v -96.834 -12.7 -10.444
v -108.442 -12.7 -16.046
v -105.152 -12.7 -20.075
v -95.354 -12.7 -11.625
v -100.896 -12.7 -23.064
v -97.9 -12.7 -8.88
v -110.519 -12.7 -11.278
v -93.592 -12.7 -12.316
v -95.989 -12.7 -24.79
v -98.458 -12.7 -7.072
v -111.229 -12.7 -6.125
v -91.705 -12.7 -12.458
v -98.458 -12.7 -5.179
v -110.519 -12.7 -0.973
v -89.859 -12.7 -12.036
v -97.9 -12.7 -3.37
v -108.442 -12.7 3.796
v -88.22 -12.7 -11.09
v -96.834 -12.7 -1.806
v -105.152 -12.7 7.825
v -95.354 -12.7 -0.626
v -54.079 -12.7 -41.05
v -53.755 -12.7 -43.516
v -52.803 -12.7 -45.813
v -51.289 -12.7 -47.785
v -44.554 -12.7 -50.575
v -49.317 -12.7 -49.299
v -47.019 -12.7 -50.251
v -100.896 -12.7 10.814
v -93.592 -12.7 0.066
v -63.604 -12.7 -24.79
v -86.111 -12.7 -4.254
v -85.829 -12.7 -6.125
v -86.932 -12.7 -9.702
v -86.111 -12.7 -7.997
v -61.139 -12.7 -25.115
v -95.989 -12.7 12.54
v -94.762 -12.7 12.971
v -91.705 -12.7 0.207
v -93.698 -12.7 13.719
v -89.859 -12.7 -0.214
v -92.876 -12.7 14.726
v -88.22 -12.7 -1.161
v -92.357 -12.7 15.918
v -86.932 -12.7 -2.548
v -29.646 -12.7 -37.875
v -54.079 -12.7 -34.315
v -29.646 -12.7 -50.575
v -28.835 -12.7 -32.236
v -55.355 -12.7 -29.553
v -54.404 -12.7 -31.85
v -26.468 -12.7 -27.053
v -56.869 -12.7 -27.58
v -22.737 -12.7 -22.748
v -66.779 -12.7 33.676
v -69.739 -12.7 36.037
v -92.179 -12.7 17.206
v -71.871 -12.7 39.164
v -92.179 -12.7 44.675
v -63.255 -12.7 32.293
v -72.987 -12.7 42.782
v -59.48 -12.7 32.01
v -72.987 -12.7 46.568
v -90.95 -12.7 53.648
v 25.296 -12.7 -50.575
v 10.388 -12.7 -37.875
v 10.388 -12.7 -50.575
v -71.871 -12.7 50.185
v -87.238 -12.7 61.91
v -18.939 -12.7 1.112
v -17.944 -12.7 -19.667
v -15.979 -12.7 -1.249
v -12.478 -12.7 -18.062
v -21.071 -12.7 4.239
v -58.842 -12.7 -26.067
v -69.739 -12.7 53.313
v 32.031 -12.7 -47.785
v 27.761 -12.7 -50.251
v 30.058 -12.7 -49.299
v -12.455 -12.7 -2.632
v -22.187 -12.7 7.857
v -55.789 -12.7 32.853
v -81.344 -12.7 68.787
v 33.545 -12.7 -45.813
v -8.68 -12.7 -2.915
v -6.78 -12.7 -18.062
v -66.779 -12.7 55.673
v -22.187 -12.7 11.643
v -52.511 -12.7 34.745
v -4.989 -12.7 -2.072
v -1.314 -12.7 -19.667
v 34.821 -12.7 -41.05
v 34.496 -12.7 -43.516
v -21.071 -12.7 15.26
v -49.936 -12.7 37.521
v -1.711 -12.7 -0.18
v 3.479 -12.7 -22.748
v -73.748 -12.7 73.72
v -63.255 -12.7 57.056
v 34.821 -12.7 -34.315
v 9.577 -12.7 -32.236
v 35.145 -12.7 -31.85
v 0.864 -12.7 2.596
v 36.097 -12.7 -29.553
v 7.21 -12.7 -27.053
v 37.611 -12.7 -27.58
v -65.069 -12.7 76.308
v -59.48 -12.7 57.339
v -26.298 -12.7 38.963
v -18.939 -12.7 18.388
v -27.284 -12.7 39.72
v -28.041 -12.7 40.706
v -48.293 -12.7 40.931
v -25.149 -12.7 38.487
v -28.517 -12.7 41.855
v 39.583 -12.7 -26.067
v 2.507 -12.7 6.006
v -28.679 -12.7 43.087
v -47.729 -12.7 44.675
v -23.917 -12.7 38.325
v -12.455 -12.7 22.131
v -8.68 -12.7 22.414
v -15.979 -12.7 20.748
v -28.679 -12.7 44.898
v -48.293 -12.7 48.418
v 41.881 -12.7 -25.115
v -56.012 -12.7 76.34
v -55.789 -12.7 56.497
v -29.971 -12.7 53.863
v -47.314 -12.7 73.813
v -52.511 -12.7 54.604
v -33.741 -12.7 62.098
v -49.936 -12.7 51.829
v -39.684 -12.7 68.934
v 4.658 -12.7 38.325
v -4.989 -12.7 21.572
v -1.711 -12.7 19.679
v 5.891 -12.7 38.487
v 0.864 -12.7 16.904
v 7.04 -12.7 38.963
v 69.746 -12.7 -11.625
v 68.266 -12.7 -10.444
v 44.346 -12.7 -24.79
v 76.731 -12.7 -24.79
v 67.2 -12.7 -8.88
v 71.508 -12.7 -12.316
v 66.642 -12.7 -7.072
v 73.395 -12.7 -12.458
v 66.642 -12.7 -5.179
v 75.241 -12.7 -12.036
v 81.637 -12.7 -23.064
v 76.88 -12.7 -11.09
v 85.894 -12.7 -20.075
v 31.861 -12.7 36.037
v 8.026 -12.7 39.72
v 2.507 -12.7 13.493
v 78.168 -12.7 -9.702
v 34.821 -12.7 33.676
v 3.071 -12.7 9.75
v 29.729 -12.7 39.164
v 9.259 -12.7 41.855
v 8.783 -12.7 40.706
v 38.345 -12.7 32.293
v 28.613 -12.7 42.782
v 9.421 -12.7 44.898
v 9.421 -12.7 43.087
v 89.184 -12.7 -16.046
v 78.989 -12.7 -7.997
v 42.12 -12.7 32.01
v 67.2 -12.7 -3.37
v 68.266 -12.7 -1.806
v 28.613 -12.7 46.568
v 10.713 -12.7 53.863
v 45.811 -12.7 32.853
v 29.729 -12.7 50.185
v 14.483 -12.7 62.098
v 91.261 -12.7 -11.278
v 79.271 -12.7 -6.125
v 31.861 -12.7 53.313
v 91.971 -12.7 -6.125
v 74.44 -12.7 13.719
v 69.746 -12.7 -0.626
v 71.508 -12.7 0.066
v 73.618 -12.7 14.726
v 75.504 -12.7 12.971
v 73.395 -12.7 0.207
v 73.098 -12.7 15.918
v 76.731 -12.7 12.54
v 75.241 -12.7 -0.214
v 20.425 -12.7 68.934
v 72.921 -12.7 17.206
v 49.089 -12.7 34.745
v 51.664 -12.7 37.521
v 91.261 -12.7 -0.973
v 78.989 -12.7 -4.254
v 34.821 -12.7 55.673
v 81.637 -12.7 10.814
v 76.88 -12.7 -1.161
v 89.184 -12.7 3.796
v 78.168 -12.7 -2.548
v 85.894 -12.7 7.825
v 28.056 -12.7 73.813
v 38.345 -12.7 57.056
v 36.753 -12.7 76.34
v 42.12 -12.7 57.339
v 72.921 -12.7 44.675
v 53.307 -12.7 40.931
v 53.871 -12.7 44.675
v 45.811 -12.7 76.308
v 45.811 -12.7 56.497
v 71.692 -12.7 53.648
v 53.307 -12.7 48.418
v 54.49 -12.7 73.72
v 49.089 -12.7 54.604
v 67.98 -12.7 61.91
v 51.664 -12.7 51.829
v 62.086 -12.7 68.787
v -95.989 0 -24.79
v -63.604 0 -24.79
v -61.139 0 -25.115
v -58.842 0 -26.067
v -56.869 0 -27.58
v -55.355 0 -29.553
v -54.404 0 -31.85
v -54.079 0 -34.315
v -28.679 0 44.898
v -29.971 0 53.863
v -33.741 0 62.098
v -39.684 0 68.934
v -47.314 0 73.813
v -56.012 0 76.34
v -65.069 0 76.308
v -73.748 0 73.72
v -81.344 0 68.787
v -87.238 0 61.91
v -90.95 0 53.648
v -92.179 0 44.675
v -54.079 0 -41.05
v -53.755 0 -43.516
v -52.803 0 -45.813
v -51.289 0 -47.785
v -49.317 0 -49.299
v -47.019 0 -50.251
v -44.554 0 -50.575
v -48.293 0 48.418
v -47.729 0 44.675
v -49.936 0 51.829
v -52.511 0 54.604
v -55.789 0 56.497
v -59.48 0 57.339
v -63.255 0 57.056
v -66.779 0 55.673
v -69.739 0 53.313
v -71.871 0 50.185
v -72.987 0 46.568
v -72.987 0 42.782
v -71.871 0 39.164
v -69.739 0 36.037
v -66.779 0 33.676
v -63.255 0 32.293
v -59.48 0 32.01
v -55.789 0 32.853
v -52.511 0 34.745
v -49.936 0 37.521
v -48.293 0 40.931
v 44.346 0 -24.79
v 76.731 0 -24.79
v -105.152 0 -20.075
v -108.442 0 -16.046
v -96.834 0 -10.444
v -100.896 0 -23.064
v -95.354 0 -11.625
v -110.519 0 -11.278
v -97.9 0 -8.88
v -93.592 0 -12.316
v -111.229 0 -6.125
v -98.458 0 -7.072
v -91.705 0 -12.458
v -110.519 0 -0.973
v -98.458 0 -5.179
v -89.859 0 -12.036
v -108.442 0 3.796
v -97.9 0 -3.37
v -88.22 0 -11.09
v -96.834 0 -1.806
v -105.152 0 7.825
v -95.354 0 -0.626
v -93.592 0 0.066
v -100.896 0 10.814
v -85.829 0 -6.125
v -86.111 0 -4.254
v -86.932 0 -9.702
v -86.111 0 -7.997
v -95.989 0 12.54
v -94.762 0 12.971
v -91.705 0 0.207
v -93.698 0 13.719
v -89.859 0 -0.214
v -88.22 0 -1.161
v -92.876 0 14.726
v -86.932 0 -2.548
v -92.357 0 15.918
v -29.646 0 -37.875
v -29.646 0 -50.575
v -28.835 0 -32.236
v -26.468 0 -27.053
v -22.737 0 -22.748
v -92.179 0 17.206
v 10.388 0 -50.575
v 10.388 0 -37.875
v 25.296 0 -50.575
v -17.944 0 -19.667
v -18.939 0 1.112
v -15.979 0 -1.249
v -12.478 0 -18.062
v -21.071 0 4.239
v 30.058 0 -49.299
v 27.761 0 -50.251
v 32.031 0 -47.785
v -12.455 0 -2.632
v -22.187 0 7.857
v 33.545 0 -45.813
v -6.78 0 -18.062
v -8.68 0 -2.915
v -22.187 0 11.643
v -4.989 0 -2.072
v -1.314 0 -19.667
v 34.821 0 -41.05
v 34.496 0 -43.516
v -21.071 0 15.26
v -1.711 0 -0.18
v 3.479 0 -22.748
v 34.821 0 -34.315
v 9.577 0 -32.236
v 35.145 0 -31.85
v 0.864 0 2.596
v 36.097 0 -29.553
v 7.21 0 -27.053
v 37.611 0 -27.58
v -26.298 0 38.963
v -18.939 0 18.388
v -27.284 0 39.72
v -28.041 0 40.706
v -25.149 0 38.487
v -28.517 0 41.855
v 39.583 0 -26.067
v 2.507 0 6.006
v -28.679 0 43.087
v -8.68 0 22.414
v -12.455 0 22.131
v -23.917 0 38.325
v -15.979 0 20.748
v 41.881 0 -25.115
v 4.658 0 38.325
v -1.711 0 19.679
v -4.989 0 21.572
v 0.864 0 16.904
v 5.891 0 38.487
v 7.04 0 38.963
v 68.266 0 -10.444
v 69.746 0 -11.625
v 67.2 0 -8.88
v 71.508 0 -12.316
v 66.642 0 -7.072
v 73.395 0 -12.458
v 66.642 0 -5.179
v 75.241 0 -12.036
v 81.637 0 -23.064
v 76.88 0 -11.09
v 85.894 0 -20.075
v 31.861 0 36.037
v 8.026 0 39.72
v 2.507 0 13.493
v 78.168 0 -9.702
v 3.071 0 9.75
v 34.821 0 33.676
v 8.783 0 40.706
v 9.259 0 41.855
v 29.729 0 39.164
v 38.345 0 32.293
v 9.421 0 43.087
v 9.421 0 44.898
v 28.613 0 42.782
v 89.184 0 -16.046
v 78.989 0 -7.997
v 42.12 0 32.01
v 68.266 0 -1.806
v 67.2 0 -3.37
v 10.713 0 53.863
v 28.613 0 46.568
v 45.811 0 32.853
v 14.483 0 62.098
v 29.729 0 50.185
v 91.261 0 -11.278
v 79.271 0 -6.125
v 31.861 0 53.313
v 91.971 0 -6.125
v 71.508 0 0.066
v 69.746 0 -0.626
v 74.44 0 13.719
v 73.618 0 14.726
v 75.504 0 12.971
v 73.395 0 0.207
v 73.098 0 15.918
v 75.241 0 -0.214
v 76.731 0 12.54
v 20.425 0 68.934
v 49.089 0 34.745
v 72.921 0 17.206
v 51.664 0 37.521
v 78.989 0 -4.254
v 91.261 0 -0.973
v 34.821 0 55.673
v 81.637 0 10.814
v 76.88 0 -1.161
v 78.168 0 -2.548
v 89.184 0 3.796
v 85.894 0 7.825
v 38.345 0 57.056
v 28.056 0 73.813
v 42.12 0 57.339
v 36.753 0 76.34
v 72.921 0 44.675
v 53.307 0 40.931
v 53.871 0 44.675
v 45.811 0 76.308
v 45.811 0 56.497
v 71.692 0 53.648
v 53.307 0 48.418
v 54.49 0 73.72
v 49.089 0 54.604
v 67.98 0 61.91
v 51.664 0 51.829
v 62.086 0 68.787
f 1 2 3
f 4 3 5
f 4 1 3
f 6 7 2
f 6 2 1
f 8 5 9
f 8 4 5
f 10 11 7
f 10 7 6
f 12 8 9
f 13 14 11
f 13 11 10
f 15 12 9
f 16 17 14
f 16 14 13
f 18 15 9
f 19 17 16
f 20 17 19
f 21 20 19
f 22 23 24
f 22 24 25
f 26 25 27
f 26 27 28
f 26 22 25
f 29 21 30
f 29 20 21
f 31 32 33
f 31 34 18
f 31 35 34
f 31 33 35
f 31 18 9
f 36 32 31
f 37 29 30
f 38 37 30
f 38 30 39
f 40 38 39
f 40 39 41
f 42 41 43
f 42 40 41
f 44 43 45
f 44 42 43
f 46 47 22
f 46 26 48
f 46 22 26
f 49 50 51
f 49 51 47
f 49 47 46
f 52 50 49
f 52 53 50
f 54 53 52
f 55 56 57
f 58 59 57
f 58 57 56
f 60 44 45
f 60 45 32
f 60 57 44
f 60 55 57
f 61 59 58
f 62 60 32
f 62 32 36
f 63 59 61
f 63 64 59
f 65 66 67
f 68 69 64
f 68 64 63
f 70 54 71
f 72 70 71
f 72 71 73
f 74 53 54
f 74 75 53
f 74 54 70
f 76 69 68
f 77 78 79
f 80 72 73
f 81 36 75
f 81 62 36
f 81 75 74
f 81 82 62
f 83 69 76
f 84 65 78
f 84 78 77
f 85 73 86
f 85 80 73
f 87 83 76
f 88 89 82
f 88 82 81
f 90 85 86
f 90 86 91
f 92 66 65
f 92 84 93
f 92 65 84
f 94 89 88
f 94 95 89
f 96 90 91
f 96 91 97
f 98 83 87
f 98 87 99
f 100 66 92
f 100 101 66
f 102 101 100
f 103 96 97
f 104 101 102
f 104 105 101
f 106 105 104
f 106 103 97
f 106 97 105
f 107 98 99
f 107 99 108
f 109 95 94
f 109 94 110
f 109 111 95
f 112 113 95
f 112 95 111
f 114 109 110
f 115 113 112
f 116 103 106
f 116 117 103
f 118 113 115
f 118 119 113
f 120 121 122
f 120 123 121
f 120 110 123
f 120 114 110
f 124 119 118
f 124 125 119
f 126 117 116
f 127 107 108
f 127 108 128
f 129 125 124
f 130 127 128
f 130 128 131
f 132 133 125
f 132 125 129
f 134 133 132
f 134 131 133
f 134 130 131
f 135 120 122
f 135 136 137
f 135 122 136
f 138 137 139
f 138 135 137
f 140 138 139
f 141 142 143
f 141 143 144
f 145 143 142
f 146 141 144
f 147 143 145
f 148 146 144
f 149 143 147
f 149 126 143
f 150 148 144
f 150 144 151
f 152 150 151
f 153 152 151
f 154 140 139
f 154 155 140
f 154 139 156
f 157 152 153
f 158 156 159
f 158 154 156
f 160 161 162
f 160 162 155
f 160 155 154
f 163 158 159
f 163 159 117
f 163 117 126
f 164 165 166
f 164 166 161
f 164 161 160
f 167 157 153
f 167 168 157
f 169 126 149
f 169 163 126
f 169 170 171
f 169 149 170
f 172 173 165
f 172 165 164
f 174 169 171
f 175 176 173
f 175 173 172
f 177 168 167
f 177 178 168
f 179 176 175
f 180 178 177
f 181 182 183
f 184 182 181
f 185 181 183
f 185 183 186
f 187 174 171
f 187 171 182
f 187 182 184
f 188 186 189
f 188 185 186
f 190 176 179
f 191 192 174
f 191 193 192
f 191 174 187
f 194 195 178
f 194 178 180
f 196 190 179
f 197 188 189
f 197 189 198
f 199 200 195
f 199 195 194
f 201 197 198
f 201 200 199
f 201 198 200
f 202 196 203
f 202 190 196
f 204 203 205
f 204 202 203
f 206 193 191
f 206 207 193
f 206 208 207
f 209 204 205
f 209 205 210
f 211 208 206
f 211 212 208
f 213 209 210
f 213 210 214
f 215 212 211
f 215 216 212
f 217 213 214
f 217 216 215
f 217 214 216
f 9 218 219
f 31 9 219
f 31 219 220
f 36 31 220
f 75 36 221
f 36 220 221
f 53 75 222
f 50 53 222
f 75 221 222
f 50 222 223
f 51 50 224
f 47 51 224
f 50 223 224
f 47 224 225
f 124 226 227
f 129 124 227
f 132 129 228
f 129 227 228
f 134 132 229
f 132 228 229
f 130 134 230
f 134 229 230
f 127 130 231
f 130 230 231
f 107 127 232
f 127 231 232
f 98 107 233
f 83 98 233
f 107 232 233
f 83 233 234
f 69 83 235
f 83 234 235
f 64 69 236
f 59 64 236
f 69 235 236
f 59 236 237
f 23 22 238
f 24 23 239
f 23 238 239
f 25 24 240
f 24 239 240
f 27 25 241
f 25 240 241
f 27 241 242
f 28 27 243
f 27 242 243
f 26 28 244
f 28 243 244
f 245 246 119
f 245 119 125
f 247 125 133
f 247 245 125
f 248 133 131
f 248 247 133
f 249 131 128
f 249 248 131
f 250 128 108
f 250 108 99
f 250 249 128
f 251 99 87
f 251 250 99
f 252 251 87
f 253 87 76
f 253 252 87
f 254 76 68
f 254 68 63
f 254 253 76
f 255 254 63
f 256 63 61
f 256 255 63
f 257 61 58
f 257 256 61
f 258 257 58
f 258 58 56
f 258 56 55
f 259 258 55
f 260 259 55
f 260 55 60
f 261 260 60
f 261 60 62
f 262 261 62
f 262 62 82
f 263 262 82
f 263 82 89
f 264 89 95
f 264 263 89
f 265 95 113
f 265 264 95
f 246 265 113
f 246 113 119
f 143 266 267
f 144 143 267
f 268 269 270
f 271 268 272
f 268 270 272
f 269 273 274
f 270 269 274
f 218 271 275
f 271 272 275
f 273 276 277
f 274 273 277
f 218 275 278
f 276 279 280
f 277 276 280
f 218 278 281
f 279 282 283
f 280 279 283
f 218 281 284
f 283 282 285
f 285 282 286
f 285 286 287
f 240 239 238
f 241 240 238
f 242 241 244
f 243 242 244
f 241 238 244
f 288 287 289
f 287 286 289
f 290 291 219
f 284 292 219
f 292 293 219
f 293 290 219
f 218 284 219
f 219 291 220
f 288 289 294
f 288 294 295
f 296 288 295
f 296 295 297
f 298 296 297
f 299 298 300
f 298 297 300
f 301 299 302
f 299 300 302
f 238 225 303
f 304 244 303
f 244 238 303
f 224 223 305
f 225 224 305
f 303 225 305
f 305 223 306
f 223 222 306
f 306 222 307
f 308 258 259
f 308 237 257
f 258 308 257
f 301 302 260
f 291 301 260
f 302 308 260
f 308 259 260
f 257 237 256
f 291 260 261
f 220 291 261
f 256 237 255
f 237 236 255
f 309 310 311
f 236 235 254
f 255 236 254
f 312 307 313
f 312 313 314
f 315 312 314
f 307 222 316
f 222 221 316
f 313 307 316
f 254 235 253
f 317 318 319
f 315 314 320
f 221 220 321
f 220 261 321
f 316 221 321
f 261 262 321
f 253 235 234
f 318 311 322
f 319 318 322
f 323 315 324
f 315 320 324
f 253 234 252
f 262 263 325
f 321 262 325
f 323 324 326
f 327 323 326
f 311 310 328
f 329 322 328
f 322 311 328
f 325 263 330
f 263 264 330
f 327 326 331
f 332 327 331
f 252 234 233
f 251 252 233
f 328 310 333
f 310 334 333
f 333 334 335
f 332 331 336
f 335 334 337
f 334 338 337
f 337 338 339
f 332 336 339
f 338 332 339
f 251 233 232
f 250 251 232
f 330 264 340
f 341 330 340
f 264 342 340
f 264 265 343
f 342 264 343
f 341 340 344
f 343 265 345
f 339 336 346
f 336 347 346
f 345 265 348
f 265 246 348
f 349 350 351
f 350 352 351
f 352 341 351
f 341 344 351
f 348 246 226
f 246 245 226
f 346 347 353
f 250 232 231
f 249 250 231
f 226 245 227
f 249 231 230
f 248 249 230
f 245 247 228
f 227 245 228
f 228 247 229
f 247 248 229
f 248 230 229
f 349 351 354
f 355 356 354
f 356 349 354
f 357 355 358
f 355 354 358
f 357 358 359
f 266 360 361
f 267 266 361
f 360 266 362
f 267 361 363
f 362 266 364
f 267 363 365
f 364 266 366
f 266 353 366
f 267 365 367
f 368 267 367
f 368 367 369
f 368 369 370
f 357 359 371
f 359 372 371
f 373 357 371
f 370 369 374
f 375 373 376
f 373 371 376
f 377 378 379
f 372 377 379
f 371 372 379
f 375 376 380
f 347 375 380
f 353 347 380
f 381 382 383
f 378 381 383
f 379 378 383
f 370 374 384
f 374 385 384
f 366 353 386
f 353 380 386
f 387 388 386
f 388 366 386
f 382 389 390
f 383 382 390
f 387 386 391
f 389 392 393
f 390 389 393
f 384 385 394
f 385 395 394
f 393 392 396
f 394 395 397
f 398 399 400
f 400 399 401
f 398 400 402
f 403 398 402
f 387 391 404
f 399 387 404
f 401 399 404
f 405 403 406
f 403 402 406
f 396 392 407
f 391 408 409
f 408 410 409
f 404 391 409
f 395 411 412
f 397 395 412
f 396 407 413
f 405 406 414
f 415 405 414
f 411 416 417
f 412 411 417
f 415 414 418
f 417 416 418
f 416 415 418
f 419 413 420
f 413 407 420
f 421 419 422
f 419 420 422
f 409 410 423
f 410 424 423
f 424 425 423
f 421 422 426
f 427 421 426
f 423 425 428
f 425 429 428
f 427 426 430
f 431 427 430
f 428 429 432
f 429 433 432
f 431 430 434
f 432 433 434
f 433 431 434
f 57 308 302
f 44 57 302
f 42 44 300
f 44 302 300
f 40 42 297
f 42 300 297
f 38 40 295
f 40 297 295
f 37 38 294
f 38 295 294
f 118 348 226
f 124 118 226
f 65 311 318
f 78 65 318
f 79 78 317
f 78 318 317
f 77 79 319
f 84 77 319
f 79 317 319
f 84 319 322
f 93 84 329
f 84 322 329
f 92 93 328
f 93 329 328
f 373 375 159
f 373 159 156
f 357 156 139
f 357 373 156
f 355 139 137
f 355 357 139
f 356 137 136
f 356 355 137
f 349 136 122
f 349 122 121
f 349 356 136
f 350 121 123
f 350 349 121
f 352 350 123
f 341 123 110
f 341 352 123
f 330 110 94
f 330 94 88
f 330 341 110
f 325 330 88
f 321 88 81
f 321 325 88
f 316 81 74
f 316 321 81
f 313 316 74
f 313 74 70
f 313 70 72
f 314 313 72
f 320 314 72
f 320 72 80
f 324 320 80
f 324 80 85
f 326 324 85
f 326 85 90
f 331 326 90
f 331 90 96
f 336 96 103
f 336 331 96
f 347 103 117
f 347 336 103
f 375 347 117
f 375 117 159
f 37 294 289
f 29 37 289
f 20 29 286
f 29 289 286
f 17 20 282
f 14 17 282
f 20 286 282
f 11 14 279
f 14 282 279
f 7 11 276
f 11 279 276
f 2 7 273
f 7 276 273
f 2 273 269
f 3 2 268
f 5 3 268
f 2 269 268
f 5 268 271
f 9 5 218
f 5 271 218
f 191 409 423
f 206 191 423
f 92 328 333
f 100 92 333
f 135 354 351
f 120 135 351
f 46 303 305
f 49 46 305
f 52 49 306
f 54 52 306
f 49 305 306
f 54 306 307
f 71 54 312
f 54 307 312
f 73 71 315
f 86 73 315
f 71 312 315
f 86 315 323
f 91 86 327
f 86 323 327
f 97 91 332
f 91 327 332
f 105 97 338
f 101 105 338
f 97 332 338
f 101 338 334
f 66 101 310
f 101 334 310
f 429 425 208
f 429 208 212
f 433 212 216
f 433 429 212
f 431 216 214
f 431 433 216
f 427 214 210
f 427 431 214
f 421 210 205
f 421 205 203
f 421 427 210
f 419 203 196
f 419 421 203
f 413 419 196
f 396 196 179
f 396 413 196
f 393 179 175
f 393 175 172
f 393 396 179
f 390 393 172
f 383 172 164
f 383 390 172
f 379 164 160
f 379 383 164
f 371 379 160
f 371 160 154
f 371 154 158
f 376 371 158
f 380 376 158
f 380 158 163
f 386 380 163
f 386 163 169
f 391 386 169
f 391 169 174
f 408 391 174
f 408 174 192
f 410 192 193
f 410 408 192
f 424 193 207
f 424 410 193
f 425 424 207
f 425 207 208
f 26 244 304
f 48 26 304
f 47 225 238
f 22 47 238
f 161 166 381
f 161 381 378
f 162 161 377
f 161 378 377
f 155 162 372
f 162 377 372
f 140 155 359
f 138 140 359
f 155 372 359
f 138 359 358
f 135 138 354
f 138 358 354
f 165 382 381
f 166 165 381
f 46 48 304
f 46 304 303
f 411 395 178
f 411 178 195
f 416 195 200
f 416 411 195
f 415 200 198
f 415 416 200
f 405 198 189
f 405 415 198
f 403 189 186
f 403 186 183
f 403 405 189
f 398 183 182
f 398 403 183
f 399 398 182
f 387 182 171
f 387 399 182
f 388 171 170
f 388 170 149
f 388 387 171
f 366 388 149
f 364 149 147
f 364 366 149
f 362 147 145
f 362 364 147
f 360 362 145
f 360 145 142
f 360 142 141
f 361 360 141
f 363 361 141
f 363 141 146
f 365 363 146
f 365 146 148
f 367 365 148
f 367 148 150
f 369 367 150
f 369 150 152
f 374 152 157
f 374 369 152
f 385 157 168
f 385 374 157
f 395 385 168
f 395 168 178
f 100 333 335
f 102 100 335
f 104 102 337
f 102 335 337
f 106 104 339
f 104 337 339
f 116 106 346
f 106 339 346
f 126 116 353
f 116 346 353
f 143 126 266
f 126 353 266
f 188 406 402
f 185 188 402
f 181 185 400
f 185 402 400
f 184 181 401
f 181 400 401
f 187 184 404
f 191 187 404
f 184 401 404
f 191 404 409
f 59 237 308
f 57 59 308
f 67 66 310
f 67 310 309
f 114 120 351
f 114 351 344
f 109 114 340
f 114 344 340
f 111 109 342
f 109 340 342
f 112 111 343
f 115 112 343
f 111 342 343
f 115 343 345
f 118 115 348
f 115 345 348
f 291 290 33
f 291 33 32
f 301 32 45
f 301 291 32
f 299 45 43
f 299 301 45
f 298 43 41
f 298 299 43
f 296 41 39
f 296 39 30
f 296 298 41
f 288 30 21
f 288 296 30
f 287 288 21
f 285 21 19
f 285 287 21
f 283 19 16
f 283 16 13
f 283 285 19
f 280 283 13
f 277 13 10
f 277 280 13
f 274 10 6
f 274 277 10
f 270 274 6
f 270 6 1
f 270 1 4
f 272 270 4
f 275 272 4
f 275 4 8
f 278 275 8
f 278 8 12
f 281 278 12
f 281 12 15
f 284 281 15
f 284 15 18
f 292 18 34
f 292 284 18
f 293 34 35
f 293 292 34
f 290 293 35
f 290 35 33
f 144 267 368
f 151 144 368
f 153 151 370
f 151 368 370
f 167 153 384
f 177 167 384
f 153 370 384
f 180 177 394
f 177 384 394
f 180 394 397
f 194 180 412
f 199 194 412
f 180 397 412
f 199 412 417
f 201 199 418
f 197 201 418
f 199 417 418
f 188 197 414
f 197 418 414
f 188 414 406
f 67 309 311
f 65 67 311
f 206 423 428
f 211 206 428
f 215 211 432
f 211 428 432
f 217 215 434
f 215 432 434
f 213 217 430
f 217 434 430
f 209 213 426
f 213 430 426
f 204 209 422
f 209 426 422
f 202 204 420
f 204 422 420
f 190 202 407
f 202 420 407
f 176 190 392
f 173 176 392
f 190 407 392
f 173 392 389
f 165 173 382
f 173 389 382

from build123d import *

# Parameters (mm, degrees)
F0_R     = 6.35
F0_R_2   = 12.7
F1_DEPTH = 12.7


with BuildPart() as f1:
    # F0 (on Front) → F1 (new body)
    with BuildSketch(Plane.XZ):
        with BuildLine():
            Line((4.658427, 38.324708), (-23.916573, 38.324708))
            ThreePointArc((-23.916573, 38.324708), (-27.284169, 39.719612), (-28.679073, 43.087208))
            Line((-28.679073, 43.087208), (-28.679073, 44.898387))
            ThreePointArc((-28.679073, 44.898387), (-60.541307, 76.648584), (-92.179073, 44.674708))
            Line((-92.179073, 44.674708), (-92.179073, 17.206098))
            ThreePointArc((-92.179073, 17.206098), (-93.252557, 14.194029), (-95.989073, 12.53982))
            ThreePointArc((-95.989073, 12.53982), (-111.229073, -6.125292), (-95.989073, -24.790403))
            Line((-95.989073, -24.790403), (-92.179073, -24.790403))
            Line((-92.179073, -24.790403), (-63.604073, -24.790403))
            ThreePointArc((-63.604073, -24.790403), (-56.868881, -27.580211), (-54.079073, -34.315403))
            Line((-54.079073, -34.315403), (-54.079073, -41.050292))
            ThreePointArc((-54.079073, -41.050292), (-51.289266, -47.785484), (-44.554073, -50.575292))
            Line((-44.554073, -50.575292), (-29.646001, -50.575292))
            Line((-29.646001, -50.575292), (-29.646001, -37.875292))
            ThreePointArc((-29.646001, -37.875292), (-9.629073, -17.858364), (10.387854, -37.875292))
            Line((10.387854, -37.875292), (10.387854, -50.575292))
            Line((10.387854, -50.575292), (25.295927, -50.575292))
            ThreePointArc((25.295927, -50.575292), (32.031119, -47.785484), (34.820927, -41.050292))
            Line((34.820927, -41.050292), (34.820927, -34.315403))
            ThreePointArc((34.820927, -34.315403), (37.610734, -27.580211), (44.345927, -24.790403))
            Line((44.345927, -24.790403), (72.920927, -24.790403))
            Line((72.920927, -24.790403), (76.730927, -24.790403))
            ThreePointArc((76.730927, -24.790403), (91.970927, -6.125292), (76.730927, 12.53982))
            ThreePointArc((76.730927, 12.53982), (73.99441, 14.194029), (72.920927, 17.206098))
            Line((72.920927, 17.206098), (72.920927, 44.674708))
            ThreePointArc((72.920927, 44.674708), (41.28316, 76.648584), (9.420927, 44.898387))
            Line((9.420927, 44.898387), (9.420927, 43.087208))
            ThreePointArc((9.420927, 43.087208), (8.026023, 39.719612), (4.658427, 38.324708))
        make_face()
        with Locations((-92.179073, -6.125292)):
            Circle(F0_R, mode=Mode.SUBTRACT)
        with Locations((-9.629073, 9.749708)):
            Circle(F0_R_2, mode=Mode.SUBTRACT)
        with Locations((72.920927, -6.125292)):
            Circle(F0_R, mode=Mode.SUBTRACT)
        with Locations((-60.429073, 44.674708)):
            Circle(F0_R_2, mode=Mode.SUBTRACT)
        with Locations((41.170927, 44.674708)):
            Circle(F0_R_2, mode=Mode.SUBTRACT)
    extrude(amount=F1_DEPTH)


solid = f1.part
